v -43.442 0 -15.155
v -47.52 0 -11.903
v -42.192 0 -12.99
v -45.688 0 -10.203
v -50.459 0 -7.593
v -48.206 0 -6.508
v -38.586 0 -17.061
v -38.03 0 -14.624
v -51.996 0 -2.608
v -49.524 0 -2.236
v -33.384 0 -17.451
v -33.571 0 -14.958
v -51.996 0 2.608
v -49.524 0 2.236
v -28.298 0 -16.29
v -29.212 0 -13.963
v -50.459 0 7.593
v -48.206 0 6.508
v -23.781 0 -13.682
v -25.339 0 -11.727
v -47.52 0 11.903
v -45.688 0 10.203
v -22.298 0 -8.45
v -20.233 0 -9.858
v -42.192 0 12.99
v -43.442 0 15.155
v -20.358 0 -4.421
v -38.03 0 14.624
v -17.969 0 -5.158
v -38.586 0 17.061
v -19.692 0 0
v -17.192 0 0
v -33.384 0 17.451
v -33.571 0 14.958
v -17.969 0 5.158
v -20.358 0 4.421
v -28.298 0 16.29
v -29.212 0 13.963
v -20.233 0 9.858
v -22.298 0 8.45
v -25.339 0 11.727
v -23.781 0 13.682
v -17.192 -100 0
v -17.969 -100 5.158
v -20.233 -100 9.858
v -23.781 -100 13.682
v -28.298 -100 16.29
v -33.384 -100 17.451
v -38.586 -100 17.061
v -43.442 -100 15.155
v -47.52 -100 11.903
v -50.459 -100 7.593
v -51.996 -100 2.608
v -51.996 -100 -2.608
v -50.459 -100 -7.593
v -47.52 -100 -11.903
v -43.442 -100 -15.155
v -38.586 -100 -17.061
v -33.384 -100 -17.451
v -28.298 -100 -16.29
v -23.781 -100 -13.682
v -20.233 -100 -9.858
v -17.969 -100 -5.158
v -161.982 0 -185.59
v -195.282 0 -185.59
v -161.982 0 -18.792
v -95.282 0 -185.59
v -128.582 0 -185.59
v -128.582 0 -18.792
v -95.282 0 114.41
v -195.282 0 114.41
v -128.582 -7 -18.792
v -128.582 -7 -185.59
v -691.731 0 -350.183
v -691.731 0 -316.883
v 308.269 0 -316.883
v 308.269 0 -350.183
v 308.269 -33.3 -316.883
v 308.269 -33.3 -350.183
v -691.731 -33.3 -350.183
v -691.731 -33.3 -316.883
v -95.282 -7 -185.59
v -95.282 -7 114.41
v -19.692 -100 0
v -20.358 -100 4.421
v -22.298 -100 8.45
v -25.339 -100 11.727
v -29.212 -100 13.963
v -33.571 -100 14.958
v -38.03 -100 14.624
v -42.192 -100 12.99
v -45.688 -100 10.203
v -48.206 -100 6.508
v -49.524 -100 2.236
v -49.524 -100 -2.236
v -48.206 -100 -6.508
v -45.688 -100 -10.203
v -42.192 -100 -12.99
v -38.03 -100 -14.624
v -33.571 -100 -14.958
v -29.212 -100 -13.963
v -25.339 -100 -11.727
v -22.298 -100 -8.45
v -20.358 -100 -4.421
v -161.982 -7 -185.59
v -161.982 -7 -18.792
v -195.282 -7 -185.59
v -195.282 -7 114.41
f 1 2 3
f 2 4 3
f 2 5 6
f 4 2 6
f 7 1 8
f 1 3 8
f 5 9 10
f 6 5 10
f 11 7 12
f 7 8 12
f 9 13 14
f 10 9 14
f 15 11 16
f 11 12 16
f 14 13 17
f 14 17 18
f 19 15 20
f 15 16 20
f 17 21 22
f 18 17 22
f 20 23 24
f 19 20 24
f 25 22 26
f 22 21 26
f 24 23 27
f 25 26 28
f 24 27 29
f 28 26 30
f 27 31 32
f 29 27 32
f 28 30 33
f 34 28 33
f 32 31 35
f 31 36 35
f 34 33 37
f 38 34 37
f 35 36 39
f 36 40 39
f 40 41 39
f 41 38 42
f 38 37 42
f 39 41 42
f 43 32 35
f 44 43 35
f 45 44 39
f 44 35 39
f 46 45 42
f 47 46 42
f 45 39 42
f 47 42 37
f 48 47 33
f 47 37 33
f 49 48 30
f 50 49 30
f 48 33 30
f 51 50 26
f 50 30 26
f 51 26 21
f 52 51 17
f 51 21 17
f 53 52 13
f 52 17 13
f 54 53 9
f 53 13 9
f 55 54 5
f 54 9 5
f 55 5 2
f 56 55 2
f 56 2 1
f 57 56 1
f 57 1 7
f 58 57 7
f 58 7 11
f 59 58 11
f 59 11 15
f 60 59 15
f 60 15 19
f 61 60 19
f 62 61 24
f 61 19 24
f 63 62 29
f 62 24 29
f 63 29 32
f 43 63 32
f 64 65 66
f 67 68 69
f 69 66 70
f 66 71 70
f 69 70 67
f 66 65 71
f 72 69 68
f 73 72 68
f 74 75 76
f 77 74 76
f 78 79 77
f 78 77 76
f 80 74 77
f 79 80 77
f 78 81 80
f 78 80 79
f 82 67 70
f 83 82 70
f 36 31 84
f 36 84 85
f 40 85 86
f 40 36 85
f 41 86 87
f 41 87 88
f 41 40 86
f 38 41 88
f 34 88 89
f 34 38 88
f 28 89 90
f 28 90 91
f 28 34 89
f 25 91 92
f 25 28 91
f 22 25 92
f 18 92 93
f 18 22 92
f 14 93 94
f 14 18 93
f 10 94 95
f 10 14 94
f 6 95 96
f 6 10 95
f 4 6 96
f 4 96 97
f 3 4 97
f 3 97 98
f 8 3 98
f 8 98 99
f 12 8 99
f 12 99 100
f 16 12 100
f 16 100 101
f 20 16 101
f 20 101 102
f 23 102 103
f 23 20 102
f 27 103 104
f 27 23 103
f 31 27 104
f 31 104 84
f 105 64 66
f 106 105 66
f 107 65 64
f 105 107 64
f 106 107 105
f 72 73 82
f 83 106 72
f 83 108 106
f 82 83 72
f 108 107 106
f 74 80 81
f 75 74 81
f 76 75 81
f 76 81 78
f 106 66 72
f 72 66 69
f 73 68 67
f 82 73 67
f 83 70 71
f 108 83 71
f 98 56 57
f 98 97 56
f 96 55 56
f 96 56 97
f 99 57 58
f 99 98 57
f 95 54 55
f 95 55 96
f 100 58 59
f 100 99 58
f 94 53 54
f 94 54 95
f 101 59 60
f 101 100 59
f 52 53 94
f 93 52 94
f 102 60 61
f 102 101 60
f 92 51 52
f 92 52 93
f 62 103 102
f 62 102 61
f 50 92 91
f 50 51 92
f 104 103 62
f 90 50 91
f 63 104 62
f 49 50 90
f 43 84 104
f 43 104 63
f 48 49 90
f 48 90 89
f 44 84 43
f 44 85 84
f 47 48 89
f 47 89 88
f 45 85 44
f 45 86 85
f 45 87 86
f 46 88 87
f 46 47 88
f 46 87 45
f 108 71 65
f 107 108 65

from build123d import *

# Parameters (mm, degrees)
F0_R     = 17.5
F0_R_2   = 15
F1_DEPTH = 100
F3_DEPTH = 7
F4_W     = 1000
F4_H     = 33.3
F5_DEPTH = 33.3


with BuildPart() as f1:
    # F0 (on Front) → F1 (new body)
    with BuildSketch(Plane.XZ):
        with Locations((-34.691794, 0)):
            Circle(F0_R)
        with Locations((-34.691794, 0)):
            Circle(F0_R_2, mode=Mode.SUBTRACT)
    extrude(amount=F1_DEPTH)


with BuildPart() as f3:
    # F2 (on Front) → F3 (new body)
    with BuildSketch(Plane.XZ):
        Polygon((-95.282343, -185.589922), (-95.282343, 114.410078), (-195.282343, 114.410078), (-195.282343, -185.589922), (-161.982343, -185.589922), (-161.982343, -18.791569), (-128.582343, -18.791569), (-128.582343, -185.589922), align=None)
    extrude(amount=F3_DEPTH)


with BuildPart() as f5:
    # F4 (on Front) → F5 (new body)
    with BuildSketch(Plane.XZ):
        with Locations((-191.730669, -333.533198)):
            Rectangle(F4_W, F4_H)
    extrude(amount=F5_DEPTH)


solid = Compound([f1.part, f3.part, f5.part])
